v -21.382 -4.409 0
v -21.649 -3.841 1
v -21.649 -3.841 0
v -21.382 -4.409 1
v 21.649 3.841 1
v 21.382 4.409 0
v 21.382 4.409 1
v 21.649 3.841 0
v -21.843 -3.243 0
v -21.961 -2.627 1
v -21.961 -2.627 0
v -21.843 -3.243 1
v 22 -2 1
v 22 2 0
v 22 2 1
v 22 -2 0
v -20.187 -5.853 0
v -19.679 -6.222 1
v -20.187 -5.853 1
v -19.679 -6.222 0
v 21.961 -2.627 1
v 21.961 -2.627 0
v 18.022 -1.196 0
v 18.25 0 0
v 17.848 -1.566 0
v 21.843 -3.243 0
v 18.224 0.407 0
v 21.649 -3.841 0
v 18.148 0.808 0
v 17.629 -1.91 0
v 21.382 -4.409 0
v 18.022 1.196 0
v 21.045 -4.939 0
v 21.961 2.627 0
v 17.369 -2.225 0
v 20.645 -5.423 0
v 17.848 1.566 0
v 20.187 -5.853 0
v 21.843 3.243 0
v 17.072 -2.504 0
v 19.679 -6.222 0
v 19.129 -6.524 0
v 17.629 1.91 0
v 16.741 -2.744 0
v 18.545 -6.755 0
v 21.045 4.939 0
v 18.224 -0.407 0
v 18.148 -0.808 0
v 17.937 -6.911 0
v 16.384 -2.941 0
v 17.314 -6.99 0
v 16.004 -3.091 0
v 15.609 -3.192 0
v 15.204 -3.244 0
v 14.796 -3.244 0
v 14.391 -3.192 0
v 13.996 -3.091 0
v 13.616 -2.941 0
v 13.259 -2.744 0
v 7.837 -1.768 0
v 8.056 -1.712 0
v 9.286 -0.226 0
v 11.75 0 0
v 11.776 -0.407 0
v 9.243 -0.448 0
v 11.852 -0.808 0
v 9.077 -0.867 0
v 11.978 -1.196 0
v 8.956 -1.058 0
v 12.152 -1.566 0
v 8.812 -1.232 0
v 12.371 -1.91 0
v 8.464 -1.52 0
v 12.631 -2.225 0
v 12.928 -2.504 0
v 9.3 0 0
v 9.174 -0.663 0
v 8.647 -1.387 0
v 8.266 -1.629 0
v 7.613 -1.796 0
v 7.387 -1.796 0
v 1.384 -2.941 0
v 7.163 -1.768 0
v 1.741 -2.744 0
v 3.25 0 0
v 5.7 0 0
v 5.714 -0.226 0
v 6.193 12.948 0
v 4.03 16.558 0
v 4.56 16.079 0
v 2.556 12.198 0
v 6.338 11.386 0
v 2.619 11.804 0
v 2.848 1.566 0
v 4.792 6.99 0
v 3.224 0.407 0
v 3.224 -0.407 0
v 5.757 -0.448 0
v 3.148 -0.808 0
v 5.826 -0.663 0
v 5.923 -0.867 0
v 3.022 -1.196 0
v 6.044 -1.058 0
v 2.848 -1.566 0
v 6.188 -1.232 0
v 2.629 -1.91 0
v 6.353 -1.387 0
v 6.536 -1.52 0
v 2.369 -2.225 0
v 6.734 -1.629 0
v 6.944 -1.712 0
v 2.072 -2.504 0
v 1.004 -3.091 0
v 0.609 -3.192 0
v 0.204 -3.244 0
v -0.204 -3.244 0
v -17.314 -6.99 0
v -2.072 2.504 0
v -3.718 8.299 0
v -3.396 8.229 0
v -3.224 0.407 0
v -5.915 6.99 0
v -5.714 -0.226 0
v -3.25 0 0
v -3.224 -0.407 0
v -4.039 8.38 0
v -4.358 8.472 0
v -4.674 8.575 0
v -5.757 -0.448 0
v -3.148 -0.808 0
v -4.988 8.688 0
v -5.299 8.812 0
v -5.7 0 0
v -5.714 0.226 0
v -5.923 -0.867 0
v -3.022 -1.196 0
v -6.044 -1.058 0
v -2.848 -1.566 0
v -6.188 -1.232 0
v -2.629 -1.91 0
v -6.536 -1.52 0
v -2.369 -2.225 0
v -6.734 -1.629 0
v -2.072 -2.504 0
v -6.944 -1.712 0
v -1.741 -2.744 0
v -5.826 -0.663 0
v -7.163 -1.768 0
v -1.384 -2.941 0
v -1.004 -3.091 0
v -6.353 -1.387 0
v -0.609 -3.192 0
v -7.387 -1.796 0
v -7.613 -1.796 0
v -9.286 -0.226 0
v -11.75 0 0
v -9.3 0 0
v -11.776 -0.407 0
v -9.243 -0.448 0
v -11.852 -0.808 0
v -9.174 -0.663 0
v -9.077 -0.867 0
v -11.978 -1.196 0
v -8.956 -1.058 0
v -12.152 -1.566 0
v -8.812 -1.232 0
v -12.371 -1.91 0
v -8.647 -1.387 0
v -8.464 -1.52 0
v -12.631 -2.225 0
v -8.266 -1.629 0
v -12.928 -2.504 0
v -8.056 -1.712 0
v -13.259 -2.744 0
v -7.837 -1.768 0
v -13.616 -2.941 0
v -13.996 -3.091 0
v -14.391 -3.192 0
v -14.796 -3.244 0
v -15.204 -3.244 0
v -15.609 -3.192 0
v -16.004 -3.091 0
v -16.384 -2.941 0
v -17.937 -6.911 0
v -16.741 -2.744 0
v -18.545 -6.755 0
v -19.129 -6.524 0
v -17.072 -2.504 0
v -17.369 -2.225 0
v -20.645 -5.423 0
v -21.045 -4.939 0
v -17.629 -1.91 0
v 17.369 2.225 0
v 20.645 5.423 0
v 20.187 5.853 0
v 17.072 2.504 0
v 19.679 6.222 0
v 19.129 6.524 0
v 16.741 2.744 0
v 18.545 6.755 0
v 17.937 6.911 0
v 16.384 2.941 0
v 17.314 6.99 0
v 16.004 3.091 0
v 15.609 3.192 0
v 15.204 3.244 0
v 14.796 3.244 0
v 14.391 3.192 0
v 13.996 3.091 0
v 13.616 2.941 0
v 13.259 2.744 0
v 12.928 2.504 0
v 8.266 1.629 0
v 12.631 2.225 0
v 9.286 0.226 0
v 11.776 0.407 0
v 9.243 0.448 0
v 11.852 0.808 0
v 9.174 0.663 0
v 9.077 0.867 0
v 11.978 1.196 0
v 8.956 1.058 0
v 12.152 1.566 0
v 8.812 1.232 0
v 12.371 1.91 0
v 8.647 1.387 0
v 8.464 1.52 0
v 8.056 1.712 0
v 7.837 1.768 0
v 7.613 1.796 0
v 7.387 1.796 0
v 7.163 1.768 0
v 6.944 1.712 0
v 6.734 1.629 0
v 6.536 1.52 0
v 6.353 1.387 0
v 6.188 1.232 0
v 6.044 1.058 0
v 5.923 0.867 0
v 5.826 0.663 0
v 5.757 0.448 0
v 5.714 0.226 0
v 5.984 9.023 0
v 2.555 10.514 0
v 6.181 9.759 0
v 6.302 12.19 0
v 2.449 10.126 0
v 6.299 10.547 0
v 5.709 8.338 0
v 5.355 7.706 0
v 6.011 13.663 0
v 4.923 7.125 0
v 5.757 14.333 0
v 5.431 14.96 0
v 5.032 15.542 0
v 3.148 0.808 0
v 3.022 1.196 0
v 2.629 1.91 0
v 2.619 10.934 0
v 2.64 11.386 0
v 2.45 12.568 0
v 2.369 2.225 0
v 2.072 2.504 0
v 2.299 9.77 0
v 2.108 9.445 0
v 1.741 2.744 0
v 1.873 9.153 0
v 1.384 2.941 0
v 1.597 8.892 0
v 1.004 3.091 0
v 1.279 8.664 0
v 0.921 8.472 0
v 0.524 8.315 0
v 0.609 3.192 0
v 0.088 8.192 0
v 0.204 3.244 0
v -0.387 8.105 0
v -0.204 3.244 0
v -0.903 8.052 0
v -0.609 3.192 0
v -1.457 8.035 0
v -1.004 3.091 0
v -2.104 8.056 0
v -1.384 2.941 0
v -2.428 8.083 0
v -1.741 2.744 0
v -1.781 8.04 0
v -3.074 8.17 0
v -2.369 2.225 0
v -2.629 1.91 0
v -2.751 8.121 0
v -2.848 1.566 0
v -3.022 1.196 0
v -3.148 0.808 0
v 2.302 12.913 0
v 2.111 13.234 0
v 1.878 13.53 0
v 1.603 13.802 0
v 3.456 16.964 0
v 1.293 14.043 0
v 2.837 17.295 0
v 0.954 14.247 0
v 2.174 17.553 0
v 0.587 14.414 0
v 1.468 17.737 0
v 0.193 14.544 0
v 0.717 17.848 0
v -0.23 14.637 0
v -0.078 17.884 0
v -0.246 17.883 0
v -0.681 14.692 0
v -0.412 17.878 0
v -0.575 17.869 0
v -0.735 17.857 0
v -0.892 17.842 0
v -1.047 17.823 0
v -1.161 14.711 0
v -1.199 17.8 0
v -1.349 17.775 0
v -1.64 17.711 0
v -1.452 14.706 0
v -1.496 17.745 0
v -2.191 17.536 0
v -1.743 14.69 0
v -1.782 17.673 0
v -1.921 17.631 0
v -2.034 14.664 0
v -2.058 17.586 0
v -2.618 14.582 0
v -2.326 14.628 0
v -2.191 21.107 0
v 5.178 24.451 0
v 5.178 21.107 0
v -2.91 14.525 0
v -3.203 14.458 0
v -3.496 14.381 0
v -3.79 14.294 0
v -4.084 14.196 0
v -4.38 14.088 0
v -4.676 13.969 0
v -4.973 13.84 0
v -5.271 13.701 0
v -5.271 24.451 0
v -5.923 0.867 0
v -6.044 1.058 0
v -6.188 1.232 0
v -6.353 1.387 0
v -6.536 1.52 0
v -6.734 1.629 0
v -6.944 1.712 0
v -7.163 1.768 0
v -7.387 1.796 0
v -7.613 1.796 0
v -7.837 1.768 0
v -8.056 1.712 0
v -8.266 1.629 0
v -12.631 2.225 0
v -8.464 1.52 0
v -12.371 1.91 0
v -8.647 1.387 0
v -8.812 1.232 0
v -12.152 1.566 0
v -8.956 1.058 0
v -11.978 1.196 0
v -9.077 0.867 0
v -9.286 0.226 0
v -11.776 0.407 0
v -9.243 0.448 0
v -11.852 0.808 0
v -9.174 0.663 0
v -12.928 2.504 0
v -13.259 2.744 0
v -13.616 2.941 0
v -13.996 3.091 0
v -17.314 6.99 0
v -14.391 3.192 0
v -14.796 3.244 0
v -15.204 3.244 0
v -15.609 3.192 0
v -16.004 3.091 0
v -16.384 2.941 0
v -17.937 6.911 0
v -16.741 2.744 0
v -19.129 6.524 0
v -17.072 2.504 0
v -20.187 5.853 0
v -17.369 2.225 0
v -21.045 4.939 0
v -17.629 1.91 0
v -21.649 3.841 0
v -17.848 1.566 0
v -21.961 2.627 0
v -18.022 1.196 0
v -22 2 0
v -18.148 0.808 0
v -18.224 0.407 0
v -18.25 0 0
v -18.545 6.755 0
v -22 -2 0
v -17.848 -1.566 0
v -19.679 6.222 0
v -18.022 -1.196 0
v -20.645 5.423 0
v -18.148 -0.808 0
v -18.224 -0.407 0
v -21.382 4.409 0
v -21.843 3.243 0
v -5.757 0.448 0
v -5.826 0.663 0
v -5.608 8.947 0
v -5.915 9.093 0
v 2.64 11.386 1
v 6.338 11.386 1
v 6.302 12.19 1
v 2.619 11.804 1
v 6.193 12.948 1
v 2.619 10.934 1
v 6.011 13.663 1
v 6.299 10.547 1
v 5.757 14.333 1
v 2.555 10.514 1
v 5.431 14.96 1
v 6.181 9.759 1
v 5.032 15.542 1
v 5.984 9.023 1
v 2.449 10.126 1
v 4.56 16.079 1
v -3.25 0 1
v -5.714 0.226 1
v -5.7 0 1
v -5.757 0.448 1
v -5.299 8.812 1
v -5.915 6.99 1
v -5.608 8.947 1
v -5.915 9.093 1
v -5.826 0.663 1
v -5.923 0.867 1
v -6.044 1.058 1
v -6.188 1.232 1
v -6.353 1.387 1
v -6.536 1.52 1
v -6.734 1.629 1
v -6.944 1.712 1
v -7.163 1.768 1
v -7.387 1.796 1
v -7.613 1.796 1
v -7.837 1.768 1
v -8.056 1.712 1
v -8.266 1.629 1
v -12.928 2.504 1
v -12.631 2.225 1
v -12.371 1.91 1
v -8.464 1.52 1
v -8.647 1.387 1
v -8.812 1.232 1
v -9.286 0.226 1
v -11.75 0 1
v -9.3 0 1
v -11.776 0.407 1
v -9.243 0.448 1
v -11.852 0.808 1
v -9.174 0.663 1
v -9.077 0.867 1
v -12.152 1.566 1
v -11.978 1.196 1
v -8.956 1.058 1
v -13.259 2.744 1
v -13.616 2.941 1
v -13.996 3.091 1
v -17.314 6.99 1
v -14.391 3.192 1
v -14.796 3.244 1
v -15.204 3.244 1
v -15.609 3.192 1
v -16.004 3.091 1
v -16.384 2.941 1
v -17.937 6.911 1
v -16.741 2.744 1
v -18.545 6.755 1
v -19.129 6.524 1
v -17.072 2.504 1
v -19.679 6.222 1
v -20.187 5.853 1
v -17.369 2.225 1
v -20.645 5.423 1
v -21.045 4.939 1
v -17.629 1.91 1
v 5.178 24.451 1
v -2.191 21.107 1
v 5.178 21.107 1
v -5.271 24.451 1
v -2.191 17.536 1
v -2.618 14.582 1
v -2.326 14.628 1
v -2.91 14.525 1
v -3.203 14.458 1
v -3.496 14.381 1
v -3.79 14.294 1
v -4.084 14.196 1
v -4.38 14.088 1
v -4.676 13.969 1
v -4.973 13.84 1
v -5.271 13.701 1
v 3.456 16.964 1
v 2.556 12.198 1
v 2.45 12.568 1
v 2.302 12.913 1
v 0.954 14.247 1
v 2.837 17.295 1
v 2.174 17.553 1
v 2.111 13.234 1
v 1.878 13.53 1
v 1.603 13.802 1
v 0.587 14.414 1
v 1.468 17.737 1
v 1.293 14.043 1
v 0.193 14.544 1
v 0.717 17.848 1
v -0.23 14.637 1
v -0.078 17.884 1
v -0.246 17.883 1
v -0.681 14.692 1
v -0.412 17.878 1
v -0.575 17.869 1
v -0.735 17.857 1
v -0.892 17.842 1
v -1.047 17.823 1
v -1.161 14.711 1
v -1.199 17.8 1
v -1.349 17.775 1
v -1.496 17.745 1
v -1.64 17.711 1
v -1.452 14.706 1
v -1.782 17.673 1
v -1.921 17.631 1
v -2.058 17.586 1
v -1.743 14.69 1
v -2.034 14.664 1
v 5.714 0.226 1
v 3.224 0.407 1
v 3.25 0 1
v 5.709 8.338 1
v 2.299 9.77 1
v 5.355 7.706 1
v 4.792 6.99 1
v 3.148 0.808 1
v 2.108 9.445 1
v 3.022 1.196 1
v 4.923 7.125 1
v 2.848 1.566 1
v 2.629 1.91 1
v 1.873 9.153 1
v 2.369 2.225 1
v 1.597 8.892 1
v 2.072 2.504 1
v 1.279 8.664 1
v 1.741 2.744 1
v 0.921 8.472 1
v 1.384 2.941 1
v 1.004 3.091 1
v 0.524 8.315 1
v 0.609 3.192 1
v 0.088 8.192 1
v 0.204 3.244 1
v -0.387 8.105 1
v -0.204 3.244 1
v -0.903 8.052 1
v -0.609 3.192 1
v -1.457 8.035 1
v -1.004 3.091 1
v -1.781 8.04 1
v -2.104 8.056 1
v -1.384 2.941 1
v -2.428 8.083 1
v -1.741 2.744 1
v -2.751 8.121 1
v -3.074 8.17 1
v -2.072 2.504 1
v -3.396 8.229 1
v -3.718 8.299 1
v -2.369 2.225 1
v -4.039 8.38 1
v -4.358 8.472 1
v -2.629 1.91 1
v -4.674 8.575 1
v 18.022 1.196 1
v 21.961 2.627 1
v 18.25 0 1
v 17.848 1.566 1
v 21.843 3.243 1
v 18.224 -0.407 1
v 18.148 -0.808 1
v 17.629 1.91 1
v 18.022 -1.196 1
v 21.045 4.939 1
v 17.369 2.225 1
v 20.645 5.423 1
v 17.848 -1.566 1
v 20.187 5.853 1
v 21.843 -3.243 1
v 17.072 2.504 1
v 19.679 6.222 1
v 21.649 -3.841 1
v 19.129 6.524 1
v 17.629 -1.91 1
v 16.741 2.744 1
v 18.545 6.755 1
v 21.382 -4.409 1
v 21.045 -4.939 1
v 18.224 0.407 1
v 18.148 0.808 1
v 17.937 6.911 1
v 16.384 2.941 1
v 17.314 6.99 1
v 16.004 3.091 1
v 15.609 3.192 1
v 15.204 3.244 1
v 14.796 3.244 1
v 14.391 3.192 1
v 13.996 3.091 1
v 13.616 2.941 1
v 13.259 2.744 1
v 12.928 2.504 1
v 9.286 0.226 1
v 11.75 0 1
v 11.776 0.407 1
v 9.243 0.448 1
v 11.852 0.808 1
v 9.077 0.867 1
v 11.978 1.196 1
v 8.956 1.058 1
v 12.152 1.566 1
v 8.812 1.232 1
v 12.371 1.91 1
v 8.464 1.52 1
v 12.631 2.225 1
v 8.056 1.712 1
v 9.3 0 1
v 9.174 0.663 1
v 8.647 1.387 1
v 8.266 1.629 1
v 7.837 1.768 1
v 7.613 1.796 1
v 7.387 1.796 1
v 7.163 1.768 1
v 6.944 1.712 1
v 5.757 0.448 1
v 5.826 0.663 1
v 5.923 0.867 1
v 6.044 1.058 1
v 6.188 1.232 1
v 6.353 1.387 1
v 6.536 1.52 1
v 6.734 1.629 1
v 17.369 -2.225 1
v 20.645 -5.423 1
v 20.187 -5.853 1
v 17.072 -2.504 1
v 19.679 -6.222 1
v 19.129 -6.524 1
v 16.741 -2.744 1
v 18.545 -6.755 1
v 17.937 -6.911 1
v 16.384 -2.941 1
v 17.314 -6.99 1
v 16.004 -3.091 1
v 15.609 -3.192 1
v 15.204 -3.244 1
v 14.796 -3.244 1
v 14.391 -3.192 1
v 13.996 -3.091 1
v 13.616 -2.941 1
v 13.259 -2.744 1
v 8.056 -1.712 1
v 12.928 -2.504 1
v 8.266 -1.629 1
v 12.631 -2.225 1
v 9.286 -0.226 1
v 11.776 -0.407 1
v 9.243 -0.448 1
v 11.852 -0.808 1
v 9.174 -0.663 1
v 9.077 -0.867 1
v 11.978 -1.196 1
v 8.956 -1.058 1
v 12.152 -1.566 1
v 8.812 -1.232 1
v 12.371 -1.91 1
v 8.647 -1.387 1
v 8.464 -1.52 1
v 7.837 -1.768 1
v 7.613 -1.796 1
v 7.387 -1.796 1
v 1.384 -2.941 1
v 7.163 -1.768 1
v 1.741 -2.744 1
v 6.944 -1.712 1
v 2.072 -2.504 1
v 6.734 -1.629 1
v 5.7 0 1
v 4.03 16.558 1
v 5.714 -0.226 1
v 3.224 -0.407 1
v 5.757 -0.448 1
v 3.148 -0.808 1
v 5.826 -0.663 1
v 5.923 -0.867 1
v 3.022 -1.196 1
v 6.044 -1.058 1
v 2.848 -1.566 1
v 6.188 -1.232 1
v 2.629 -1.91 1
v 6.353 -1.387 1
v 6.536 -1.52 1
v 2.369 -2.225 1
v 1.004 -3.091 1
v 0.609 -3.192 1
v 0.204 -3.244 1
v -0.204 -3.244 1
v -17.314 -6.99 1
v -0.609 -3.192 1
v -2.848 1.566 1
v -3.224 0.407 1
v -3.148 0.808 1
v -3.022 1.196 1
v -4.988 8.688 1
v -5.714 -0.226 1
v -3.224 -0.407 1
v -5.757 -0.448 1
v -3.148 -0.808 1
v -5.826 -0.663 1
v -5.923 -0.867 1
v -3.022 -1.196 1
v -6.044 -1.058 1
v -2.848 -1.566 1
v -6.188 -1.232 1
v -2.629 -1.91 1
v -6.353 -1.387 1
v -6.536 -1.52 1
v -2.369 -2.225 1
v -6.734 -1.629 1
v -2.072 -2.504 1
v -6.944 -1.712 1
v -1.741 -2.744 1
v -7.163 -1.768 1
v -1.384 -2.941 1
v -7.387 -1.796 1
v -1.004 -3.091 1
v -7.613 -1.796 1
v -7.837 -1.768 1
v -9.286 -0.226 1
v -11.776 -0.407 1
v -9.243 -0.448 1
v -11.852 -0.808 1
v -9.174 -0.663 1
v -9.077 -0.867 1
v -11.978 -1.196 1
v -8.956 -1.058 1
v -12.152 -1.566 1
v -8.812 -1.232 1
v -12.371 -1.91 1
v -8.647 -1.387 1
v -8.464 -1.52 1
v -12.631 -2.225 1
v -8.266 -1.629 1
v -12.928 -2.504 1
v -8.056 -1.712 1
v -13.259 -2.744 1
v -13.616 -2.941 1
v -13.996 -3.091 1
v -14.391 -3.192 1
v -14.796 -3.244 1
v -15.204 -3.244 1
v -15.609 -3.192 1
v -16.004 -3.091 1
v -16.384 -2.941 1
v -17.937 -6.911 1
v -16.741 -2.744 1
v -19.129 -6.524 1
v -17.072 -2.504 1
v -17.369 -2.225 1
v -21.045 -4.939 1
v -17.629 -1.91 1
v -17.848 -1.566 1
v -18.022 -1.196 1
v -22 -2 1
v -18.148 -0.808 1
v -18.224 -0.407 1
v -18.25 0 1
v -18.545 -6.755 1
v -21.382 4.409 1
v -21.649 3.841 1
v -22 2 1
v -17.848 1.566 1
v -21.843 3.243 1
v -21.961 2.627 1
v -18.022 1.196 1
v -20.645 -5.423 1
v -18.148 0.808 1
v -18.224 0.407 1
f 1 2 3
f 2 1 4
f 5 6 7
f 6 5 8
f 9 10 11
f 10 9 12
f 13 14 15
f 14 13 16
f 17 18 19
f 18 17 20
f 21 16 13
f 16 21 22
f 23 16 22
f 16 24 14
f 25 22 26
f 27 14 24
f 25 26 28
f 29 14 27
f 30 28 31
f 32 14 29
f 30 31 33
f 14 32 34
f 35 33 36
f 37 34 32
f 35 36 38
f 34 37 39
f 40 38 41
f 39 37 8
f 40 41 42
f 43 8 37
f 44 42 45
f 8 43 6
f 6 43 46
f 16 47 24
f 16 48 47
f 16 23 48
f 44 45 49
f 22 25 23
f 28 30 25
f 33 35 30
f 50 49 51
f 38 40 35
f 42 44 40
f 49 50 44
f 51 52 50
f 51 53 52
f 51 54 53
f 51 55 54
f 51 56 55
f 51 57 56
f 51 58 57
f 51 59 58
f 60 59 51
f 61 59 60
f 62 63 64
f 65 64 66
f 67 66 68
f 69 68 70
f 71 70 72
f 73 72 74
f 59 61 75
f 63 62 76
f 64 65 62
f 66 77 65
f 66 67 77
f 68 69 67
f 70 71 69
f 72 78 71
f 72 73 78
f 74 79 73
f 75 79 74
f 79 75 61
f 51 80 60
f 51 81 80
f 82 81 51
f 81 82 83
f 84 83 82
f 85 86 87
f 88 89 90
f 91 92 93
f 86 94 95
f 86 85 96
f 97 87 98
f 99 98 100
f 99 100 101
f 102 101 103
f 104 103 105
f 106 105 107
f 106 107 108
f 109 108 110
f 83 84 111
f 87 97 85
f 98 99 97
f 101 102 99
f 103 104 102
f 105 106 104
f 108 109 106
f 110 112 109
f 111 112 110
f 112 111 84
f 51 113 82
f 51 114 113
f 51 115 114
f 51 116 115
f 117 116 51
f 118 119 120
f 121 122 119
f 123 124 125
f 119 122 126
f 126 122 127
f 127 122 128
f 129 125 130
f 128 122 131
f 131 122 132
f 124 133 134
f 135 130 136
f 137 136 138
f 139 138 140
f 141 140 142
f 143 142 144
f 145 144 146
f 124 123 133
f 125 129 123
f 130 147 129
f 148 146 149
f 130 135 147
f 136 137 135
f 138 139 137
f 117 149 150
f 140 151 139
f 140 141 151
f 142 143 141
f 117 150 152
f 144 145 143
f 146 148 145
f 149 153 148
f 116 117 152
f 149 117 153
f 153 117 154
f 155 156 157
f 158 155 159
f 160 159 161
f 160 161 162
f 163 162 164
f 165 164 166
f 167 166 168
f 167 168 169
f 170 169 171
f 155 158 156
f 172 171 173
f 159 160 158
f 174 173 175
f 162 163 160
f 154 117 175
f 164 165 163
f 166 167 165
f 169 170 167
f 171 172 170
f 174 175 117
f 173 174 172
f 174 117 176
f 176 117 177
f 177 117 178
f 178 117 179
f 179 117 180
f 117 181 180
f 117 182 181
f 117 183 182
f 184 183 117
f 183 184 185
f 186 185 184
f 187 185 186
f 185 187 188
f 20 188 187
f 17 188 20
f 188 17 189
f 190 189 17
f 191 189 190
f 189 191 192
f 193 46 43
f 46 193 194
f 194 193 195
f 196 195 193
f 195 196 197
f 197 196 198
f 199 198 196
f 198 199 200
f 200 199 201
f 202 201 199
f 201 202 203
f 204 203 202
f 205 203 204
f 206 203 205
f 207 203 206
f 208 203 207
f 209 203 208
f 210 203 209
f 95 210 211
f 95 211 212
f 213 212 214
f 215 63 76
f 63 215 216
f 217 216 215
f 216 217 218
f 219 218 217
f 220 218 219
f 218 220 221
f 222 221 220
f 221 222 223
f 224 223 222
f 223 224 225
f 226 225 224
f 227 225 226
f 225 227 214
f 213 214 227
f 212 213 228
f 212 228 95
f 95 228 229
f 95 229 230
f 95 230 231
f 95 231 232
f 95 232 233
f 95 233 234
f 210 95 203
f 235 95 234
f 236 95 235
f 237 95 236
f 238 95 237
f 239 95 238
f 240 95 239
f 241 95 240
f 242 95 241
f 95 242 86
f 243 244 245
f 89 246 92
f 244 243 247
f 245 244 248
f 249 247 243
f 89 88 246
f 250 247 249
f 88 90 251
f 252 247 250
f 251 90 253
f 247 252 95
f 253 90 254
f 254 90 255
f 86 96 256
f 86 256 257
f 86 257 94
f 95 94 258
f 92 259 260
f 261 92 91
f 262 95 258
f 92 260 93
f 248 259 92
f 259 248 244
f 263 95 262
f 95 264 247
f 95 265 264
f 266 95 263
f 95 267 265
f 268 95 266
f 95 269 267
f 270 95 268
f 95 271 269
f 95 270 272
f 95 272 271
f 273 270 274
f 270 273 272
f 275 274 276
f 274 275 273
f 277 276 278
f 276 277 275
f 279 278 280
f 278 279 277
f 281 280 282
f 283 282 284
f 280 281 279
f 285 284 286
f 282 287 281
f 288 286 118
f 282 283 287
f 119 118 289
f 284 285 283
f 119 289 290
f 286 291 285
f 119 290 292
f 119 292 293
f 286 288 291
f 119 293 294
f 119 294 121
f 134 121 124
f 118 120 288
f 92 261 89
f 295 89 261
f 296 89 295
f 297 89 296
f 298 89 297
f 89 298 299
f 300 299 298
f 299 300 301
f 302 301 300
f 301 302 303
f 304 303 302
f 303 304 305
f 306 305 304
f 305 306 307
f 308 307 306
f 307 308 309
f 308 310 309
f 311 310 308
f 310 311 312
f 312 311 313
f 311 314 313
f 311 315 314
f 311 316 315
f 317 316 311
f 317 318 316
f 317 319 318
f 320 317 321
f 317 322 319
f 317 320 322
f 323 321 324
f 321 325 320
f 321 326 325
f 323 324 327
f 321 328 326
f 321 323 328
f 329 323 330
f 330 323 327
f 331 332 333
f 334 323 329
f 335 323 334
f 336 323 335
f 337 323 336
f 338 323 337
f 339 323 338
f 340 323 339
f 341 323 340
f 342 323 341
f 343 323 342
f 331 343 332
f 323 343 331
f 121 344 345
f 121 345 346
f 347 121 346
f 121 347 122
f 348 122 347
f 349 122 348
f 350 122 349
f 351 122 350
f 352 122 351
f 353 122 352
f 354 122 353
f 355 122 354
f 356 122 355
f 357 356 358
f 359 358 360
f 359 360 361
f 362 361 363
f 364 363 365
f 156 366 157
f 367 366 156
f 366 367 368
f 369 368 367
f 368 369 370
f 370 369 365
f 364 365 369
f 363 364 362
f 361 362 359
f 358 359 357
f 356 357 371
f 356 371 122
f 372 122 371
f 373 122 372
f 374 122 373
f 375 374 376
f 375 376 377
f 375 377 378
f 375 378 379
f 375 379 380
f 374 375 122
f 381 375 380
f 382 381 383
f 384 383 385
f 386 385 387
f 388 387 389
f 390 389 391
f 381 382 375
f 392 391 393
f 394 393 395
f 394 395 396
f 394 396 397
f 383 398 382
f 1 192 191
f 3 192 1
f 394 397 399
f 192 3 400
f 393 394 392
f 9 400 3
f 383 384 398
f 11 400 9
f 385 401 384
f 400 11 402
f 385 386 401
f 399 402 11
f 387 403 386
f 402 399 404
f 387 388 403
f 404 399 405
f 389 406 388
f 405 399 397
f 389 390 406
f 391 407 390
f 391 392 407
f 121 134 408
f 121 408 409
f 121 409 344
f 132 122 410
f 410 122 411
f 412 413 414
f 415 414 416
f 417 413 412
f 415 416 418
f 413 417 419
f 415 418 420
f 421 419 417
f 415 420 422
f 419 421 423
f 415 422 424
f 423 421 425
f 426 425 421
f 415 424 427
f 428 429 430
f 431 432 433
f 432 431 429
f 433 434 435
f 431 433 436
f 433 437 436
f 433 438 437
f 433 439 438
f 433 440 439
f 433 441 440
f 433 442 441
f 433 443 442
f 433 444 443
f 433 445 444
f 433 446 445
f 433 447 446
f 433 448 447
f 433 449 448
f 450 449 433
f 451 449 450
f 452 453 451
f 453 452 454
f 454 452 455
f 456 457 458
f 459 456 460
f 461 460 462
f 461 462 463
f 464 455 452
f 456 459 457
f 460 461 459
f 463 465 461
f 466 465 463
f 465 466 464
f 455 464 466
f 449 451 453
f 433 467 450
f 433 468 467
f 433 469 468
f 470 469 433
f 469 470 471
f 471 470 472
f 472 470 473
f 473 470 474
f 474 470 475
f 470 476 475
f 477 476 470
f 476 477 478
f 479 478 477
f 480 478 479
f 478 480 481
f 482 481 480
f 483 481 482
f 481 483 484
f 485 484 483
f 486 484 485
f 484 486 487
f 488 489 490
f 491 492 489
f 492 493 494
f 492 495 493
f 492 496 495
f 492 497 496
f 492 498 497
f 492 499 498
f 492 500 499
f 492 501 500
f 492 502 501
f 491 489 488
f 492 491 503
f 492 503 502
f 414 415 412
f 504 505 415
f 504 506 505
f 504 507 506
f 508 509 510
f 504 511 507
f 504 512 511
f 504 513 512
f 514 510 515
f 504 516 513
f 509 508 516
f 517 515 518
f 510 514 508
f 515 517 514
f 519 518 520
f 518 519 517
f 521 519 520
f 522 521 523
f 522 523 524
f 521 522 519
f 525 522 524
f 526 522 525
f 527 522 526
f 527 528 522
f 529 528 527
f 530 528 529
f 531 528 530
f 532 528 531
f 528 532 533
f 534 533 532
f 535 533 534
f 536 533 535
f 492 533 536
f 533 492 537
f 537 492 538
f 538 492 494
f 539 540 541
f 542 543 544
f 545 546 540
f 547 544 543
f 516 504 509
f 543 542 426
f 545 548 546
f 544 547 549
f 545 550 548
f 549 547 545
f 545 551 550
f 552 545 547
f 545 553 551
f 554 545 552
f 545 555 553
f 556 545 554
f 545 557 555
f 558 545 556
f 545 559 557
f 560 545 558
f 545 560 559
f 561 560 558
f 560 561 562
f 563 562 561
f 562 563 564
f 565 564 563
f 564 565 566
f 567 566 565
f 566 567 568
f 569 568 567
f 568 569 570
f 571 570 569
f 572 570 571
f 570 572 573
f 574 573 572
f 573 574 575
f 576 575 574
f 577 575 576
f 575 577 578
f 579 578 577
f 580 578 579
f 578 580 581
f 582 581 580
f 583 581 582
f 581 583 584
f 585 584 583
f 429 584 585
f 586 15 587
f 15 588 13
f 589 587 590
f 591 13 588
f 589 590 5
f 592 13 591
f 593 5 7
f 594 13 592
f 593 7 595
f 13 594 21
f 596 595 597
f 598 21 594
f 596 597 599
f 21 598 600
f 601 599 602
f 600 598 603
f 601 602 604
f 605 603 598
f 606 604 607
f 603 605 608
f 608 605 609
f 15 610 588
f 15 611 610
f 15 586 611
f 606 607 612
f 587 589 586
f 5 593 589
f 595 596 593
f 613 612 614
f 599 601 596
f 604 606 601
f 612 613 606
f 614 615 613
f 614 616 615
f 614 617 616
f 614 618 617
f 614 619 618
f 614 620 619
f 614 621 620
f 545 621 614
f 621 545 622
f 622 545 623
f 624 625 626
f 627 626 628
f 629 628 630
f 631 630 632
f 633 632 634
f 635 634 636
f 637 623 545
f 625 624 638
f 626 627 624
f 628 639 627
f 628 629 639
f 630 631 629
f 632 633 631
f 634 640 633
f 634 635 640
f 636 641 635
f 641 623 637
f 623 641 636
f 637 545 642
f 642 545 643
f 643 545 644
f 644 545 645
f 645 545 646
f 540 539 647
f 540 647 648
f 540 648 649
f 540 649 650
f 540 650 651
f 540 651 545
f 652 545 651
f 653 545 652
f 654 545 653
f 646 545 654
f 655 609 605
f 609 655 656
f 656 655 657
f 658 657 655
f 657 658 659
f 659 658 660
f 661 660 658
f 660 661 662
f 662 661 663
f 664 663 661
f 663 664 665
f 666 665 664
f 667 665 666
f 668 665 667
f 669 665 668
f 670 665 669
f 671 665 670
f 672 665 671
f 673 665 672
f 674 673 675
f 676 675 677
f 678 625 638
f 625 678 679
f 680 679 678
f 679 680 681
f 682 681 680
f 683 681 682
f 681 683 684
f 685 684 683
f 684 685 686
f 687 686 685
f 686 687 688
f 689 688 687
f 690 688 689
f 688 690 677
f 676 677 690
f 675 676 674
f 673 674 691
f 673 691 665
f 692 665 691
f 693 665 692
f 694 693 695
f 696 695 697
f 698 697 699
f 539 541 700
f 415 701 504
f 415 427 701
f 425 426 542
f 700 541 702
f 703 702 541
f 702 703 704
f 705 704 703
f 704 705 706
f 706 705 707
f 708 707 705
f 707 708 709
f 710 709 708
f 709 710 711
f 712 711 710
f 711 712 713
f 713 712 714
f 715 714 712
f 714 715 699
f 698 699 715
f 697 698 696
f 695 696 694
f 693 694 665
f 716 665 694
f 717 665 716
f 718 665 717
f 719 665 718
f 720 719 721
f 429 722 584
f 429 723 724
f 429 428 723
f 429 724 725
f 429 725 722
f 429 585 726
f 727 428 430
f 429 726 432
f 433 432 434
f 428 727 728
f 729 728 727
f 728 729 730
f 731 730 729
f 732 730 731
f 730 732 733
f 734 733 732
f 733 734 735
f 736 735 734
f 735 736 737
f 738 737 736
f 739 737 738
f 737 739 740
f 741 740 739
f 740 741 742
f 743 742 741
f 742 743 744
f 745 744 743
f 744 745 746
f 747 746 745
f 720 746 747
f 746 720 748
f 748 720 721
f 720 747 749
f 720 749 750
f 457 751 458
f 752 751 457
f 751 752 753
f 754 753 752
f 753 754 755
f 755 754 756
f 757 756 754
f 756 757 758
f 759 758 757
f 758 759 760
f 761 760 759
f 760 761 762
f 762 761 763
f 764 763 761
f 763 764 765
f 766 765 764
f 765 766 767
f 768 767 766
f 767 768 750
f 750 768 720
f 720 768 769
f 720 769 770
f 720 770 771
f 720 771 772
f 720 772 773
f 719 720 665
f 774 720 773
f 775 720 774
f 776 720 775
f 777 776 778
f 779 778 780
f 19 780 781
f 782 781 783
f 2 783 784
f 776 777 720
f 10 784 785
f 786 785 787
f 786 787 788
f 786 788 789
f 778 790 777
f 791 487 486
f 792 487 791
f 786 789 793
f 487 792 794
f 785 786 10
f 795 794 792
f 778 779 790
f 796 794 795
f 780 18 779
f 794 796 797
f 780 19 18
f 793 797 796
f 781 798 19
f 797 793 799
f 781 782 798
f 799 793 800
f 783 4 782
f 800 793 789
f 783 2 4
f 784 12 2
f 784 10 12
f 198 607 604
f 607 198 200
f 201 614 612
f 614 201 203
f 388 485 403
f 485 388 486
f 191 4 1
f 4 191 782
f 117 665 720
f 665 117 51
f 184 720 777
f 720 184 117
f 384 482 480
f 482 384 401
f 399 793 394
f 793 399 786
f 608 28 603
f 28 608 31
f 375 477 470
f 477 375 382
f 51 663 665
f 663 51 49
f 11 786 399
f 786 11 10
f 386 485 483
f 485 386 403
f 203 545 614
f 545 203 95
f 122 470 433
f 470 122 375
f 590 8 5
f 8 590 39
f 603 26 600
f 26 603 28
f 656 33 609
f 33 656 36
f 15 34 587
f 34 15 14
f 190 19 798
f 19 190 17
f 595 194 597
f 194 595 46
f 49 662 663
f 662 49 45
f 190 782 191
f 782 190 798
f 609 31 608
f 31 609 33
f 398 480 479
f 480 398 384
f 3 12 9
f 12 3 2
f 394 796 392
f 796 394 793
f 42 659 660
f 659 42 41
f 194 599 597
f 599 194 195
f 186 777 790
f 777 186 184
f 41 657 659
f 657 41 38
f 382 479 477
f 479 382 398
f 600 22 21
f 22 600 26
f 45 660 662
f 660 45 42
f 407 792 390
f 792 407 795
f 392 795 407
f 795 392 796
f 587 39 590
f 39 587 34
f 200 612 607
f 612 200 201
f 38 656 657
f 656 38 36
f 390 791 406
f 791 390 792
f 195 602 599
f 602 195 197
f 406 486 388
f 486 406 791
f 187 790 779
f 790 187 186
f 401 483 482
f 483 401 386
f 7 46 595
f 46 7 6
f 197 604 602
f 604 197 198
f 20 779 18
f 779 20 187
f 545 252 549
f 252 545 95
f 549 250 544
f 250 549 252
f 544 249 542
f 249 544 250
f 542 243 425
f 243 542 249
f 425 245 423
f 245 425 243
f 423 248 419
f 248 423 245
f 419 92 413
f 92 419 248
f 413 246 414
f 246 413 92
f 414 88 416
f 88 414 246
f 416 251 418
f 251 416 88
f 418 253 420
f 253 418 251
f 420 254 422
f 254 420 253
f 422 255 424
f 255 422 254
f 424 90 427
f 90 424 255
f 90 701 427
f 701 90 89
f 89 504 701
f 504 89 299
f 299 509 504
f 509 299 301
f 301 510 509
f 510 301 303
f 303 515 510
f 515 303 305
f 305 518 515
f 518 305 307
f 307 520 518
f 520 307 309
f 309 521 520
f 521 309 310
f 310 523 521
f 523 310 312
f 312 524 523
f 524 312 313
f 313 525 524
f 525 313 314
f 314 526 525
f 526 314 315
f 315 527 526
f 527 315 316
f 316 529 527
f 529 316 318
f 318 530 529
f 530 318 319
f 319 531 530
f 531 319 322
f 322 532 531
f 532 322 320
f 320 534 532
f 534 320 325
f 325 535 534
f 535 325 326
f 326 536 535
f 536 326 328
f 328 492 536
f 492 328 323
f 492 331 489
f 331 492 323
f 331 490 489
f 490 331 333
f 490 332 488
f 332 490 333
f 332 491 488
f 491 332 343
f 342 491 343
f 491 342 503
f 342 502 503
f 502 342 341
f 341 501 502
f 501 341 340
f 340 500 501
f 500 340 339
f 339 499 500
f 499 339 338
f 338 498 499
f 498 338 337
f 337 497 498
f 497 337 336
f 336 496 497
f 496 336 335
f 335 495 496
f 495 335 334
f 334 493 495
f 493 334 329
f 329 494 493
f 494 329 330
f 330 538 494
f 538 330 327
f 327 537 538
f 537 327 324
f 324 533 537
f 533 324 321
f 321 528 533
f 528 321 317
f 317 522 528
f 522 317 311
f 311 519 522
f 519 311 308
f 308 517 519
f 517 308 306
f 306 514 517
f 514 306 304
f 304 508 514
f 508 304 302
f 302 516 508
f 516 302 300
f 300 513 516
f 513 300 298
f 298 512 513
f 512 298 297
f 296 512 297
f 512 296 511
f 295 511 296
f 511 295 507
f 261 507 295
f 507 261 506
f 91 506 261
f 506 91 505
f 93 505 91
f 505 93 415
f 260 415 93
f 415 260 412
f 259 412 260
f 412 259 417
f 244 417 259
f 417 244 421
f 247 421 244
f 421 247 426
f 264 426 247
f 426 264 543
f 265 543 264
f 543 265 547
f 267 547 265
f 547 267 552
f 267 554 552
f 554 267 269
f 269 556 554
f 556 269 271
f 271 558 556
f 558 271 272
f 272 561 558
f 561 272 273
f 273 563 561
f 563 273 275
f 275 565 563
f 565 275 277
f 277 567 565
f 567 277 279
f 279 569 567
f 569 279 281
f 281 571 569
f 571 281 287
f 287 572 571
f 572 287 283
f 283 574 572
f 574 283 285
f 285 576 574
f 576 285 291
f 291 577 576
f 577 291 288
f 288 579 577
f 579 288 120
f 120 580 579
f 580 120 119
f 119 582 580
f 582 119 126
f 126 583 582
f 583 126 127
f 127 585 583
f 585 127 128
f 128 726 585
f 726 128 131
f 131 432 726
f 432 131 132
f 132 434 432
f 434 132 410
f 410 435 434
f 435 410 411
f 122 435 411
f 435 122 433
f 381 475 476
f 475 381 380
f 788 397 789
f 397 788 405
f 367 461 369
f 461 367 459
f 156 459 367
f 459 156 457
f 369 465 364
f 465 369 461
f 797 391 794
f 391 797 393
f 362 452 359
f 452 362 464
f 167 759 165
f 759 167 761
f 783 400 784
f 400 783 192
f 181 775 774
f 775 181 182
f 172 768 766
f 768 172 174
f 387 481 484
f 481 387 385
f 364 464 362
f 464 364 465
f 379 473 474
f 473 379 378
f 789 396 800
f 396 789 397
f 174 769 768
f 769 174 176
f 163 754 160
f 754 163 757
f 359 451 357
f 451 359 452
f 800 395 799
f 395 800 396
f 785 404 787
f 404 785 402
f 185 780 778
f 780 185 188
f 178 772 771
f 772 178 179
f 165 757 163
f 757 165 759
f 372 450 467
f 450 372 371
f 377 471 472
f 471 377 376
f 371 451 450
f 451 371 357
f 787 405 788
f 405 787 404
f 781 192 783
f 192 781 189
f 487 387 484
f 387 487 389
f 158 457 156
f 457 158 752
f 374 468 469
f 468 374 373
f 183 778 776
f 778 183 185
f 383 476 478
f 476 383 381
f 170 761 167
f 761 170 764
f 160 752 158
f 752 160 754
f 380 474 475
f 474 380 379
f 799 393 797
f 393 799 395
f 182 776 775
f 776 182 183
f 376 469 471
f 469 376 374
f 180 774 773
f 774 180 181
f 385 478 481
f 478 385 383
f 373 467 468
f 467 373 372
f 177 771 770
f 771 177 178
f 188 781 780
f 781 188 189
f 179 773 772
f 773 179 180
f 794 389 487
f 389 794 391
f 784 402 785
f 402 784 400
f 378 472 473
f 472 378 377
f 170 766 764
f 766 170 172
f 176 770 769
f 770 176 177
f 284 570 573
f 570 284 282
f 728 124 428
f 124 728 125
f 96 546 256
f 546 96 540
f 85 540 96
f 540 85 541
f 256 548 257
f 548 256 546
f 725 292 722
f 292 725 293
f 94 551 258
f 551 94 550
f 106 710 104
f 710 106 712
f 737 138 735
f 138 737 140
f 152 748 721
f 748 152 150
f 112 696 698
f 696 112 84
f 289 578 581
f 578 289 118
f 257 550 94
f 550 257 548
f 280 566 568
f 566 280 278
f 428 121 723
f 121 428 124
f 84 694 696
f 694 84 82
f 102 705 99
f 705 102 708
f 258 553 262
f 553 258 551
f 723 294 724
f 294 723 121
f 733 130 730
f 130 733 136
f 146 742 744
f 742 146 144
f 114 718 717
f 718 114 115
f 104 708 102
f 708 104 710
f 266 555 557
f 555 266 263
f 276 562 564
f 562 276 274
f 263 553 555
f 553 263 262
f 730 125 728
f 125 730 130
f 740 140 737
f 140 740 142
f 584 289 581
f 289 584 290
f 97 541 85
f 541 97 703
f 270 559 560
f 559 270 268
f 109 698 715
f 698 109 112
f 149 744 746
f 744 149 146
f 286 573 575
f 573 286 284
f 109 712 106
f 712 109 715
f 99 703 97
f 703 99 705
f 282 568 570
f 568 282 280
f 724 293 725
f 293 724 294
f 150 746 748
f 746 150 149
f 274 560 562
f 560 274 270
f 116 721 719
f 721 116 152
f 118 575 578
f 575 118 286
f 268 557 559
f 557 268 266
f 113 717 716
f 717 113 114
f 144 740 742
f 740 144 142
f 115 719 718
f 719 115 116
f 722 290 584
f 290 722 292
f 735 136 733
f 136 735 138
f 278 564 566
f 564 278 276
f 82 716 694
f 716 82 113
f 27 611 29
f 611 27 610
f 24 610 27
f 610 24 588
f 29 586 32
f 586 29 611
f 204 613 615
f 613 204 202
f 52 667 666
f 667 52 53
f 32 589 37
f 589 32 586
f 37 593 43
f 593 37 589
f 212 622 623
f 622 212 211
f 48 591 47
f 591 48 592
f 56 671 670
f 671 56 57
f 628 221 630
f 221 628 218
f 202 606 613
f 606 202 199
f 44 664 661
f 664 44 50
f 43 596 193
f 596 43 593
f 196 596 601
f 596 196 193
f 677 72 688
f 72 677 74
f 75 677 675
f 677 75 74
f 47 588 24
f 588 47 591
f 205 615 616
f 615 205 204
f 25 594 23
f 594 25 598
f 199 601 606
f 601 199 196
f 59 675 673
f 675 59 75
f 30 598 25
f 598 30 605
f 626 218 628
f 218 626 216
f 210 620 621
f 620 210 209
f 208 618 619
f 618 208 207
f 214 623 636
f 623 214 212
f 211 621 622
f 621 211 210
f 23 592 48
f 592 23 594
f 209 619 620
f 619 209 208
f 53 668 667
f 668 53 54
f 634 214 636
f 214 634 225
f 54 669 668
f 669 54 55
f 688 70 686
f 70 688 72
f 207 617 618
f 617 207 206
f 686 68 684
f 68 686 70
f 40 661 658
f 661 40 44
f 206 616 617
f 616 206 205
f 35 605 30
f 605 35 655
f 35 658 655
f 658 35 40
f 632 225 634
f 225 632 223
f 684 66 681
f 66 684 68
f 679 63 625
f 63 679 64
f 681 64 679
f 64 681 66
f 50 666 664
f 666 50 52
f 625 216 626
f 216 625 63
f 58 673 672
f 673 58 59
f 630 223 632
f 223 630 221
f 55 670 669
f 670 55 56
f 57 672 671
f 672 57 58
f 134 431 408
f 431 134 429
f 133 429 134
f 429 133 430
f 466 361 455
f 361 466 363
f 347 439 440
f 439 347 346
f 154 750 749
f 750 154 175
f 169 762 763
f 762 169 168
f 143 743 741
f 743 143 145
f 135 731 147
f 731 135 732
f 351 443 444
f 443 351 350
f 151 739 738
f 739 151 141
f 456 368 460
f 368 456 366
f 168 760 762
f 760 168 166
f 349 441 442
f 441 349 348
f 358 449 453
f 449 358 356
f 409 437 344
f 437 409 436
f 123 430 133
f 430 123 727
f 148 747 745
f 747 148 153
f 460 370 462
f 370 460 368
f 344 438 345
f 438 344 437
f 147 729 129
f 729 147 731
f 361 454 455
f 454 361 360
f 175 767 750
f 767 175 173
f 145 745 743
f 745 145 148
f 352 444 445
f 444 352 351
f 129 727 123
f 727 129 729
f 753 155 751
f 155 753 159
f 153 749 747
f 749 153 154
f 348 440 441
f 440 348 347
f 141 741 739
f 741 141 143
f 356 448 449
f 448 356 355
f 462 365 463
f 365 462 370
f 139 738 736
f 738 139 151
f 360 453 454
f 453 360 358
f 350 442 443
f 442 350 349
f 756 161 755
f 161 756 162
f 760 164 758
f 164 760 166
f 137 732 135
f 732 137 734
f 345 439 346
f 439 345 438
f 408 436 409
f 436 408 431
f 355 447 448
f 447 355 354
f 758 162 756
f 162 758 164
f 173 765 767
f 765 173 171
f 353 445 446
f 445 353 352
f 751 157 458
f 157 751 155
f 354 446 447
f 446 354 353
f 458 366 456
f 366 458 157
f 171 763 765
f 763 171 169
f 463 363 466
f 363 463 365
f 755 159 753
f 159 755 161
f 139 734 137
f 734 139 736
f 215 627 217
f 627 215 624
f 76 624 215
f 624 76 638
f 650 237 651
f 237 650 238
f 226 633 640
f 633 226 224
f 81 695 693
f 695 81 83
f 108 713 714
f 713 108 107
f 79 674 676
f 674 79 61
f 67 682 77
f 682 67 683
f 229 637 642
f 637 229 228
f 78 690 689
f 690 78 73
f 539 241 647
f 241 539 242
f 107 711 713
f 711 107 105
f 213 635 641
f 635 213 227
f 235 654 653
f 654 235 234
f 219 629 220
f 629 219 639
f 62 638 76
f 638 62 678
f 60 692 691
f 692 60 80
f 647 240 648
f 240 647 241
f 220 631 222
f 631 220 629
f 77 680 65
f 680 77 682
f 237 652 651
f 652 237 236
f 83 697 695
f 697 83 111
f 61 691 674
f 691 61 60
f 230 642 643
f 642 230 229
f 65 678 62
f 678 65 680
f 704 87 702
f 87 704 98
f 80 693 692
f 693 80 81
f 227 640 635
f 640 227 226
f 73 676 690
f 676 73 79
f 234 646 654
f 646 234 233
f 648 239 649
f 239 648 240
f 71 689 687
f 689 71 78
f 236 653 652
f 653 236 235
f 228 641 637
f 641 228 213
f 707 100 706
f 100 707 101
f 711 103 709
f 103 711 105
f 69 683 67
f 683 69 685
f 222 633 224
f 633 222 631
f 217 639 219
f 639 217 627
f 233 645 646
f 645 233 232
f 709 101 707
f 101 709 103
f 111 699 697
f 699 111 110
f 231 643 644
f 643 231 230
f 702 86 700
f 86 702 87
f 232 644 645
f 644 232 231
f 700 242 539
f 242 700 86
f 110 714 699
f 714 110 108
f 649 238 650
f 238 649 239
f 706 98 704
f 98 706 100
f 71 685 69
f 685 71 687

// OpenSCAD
$fn = 50;


difference() {
	union() {
		hull() {
			translate(v = [-17.0000000000, 2.0000000000, 0]) {
				cylinder(h = 1, r = 5);
			}
			translate(v = [17.0000000000, 2.0000000000, 0]) {
				cylinder(h = 1, r = 5);
			}
			translate(v = [-17.0000000000, -2.0000000000, 0]) {
				cylinder(h = 1, r = 5);
			}
			translate(v = [17.0000000000, -2.0000000000, 0]) {
				cylinder(h = 1, r = 5);
			}
		}
		translate(v = [0, 24, 0]) {
			linear_extrude(height = 1) {
				text(font = "DejaVu Sans Mono:style=Bold", halign = "center", size = 19.0000000000, text = "5", valign = "top");
			}
		}
	}
	union() {
		translate(v = [-15.0000000000, 0.0000000000, 0]) {
			translate(v = [0, 0, -100]) {
				cylinder(h = 200, r = 3.2500000000);
			}
		}
		translate(v = [0, 0, -100]) {
			cylinder(h = 200, r = 3.2500000000);
		}
		translate(v = [15.0000000000, 0.0000000000, 0]) {
			translate(v = [0, 0, -100]) {
				cylinder(h = 200, r = 3.2500000000);
			}
		}
		translate(v = [-15.0000000000, 0.0000000000, 0]) {
			translate(v = [0, 0, -100]) {
				cylinder(h = 200, r = 1.8000000000);
			}
		}
		translate(v = [-7.5000000000, 0.0000000000, 0]) {
			translate(v = [0, 0, -100]) {
				cylinder(h = 200, r = 1.8000000000);
			}
		}
		translate(v = [0, 0, -100]) {
			cylinder(h = 200, r = 1.8000000000);
		}
		translate(v = [7.5000000000, 0.0000000000, 0]) {
			translate(v = [0, 0, -100]) {
				cylinder(h = 200, r = 1.8000000000);
			}
		}
		translate(v = [15.0000000000, 0.0000000000, 0]) {
			translate(v = [0, 0, -100]) {
				cylinder(h = 200, r = 1.8000000000);
			}
		}
	}
}
